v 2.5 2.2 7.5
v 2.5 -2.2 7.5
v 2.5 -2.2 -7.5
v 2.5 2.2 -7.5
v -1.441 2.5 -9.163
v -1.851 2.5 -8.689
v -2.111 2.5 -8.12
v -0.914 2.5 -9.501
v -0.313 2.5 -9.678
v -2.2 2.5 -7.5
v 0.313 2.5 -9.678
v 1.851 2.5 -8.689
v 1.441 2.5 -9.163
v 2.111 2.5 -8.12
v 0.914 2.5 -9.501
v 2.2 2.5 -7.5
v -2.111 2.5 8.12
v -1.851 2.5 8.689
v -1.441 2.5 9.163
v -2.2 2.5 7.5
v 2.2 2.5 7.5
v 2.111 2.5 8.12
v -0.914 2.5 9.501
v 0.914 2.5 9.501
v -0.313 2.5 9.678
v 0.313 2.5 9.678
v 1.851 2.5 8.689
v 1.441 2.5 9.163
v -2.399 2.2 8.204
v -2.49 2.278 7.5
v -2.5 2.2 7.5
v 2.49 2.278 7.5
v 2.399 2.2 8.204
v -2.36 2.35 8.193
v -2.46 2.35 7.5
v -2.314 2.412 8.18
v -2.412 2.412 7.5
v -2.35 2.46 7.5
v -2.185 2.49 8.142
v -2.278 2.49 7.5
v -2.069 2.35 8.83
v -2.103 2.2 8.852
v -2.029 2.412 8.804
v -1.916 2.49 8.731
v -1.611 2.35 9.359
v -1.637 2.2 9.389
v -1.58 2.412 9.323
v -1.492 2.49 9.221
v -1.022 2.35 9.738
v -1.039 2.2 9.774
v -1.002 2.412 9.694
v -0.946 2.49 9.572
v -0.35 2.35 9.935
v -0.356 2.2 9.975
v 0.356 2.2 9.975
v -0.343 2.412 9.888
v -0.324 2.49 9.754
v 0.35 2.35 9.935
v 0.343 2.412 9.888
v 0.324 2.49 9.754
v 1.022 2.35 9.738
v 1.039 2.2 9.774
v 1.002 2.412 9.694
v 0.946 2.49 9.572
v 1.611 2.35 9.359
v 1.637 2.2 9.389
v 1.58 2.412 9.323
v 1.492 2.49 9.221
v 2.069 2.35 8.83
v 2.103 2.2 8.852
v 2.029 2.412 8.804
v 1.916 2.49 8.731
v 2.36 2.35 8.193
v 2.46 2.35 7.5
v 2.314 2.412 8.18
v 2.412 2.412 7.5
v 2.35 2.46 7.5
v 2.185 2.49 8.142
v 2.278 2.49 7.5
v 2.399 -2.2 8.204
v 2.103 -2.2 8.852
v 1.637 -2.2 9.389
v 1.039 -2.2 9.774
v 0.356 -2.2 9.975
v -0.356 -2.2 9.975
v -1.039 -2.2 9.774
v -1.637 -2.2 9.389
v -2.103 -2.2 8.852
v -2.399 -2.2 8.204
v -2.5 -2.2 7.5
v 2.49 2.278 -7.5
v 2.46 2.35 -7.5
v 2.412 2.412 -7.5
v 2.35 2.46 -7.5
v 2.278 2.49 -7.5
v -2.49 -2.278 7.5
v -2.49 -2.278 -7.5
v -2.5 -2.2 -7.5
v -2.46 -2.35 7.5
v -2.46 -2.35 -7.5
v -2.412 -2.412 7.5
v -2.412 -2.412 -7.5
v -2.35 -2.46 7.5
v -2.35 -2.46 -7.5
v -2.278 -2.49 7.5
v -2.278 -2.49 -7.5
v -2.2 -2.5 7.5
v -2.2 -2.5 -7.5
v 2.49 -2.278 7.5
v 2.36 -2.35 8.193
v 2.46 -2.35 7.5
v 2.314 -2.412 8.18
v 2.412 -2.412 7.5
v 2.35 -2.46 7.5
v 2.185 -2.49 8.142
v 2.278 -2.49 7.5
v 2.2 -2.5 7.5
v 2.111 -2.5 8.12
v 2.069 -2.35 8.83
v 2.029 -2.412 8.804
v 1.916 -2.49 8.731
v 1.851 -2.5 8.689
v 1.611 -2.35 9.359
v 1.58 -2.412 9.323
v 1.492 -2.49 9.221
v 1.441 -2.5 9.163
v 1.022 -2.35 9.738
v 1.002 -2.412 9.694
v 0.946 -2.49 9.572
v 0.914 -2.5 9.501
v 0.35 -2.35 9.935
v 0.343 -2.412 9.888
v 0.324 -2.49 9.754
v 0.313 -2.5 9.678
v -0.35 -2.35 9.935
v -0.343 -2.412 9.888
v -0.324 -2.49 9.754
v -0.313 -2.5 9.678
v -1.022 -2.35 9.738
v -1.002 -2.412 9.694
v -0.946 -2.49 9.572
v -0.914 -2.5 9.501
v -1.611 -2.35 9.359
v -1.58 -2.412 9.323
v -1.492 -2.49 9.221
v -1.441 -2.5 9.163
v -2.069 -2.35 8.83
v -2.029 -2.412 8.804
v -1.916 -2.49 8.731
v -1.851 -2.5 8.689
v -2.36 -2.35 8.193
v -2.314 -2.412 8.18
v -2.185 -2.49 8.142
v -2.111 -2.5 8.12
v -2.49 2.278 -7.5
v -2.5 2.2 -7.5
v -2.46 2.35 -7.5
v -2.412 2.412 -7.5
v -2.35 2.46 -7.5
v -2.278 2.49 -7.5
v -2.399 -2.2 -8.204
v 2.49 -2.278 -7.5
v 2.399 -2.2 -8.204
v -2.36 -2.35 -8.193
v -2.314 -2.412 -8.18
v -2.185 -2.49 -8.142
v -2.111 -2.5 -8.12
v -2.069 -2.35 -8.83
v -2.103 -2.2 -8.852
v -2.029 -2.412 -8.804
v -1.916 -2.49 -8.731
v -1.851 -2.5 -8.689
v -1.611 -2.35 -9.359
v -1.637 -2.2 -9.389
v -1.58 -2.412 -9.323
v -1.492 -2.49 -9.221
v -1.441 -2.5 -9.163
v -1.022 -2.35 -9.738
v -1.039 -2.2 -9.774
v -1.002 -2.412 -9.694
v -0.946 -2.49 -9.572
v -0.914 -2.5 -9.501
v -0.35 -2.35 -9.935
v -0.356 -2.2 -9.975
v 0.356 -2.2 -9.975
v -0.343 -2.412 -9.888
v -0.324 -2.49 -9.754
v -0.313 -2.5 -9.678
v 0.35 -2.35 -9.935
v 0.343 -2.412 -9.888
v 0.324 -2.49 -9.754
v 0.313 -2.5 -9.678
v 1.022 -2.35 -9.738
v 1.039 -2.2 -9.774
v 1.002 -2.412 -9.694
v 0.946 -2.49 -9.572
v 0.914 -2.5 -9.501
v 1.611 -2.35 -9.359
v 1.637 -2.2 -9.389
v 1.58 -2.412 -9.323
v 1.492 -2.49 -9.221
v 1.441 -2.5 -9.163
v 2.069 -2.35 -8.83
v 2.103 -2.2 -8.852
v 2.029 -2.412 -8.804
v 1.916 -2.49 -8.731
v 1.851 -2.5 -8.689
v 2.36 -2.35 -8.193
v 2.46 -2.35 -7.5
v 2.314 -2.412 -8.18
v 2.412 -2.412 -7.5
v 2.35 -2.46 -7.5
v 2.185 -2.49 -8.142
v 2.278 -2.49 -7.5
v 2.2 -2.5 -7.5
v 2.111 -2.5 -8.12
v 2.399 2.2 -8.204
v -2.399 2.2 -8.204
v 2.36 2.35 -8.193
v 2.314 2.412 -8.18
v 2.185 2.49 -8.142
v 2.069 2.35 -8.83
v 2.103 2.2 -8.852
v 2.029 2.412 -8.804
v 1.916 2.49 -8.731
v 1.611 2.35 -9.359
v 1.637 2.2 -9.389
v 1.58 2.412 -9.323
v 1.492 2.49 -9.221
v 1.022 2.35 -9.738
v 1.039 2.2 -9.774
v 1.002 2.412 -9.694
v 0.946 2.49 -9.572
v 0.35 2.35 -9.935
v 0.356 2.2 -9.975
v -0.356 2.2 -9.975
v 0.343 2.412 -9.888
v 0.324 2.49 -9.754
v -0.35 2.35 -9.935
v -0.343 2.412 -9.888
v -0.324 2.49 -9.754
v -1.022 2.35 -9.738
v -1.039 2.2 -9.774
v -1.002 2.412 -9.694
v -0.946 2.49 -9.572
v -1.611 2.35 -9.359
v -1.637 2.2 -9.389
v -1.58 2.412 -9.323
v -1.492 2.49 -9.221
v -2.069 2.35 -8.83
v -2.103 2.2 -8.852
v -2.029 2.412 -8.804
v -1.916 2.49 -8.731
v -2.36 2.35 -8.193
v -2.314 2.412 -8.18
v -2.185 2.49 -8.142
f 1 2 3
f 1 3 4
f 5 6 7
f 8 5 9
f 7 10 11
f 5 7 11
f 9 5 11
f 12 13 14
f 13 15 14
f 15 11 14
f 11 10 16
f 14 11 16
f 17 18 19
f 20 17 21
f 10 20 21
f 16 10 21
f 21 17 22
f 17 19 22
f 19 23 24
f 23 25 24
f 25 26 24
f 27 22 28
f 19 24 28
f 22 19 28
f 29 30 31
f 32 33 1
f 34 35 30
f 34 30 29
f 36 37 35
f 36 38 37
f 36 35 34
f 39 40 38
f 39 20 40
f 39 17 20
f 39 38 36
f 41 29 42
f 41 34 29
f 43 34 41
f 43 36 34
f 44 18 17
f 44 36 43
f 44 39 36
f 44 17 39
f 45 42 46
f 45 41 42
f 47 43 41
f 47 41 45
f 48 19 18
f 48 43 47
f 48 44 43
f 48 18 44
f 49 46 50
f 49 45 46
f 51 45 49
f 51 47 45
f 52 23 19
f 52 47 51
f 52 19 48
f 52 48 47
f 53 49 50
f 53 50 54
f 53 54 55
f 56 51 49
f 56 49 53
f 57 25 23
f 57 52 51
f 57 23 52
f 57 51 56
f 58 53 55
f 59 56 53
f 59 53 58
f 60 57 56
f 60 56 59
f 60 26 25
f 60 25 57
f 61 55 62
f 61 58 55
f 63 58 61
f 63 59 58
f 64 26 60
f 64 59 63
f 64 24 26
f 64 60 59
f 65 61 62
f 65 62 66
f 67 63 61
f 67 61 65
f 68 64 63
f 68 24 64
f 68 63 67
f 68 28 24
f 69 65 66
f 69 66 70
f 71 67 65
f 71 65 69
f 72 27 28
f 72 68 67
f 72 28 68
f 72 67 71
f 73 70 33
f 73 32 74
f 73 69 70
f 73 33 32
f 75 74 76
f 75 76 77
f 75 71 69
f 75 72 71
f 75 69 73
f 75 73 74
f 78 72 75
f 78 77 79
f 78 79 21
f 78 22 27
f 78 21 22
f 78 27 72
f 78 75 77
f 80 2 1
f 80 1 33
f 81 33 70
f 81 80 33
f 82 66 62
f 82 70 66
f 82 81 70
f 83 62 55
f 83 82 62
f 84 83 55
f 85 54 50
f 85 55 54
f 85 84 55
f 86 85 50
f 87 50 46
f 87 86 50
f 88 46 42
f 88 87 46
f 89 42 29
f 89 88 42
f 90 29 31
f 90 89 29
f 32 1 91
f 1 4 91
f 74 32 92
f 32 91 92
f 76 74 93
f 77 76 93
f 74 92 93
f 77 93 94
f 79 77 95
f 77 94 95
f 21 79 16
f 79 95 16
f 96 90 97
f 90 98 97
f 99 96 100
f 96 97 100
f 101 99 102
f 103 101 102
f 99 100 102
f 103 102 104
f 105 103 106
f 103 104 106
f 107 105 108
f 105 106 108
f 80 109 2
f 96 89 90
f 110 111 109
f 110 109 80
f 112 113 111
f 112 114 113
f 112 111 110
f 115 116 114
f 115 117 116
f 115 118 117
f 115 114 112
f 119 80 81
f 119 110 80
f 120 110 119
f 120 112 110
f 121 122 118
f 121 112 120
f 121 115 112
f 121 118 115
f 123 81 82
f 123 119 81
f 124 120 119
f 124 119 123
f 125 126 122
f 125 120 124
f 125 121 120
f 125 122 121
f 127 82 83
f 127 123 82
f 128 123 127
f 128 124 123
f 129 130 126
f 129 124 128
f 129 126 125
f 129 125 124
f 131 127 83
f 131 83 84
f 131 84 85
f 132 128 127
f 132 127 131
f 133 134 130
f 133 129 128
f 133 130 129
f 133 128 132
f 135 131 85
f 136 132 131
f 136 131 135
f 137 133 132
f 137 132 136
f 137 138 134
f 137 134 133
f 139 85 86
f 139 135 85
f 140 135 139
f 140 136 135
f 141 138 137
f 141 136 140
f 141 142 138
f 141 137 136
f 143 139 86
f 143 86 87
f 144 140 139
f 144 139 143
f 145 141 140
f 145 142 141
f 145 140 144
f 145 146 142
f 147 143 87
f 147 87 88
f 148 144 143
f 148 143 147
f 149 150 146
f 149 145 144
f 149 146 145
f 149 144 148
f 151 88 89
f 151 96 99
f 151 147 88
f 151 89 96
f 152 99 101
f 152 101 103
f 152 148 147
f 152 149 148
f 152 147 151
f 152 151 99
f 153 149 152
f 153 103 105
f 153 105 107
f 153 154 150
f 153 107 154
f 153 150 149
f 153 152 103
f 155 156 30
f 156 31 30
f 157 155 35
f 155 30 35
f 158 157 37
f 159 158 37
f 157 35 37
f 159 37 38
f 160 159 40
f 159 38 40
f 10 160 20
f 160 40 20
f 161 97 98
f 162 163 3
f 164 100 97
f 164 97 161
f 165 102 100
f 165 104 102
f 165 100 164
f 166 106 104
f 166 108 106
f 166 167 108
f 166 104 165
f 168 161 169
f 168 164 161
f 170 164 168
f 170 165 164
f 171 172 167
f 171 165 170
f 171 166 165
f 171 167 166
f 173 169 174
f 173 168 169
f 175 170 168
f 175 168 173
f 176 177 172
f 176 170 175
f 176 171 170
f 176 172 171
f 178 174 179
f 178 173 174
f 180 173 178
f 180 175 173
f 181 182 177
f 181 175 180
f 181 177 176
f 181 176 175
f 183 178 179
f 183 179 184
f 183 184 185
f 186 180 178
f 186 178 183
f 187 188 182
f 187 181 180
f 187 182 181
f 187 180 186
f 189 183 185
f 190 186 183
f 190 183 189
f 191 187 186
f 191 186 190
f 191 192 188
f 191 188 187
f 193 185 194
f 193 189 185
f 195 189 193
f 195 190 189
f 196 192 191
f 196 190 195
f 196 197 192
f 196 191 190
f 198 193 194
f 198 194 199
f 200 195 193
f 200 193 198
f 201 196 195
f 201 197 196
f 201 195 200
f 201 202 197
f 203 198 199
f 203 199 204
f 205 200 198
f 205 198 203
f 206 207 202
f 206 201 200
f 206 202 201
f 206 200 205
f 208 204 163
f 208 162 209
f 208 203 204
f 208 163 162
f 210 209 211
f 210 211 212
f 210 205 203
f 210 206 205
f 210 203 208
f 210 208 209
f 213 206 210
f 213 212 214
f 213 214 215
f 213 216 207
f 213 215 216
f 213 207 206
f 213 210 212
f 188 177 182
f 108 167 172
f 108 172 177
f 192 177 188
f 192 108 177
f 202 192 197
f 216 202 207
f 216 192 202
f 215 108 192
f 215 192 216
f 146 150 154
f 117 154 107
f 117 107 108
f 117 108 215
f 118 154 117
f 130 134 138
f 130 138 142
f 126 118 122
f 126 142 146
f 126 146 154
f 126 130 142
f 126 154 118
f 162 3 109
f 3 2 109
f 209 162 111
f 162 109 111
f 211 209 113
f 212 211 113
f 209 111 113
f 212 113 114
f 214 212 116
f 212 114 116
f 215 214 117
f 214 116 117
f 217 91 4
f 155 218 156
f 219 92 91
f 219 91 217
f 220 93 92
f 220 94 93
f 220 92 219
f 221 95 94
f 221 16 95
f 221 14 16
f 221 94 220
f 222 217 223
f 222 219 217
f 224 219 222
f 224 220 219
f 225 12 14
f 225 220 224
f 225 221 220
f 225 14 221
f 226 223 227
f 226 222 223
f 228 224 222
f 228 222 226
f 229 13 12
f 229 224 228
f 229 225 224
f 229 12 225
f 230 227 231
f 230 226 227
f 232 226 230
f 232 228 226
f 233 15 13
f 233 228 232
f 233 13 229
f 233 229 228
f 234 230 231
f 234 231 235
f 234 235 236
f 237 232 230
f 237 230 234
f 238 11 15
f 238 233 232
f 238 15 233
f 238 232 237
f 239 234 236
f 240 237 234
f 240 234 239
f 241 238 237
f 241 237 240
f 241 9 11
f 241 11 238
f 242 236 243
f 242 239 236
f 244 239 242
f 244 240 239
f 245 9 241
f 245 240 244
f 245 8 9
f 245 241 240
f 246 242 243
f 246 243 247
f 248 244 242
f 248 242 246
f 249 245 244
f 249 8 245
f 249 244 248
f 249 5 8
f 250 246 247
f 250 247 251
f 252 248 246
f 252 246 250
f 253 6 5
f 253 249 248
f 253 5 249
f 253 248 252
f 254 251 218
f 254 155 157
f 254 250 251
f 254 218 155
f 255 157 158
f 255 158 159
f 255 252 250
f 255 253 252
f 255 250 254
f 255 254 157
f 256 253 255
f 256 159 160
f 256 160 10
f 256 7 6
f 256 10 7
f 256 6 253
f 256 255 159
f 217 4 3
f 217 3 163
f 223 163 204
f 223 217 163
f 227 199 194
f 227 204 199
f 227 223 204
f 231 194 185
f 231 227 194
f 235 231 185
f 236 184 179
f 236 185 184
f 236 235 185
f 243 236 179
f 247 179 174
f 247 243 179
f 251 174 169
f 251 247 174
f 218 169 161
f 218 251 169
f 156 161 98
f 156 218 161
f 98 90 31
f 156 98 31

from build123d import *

# Parameters (mm, degrees)
SKETCH1_W           = 5
SKETCH1_H           = 5
BOSS_EXTRUDE1_DEPTH = 10
FILLET1_RADIUS      = 2.5
FILLET1_LENGTH      = 5
FILLET2_RADIUS      = 2.5
FILLET2_LENGTH      = 5
FILLET3_R           = 0.3


with BuildPart() as part:
    # Sketch1 → Boss-Extrude1 (new, symmetric)
    with BuildSketch(Plane.XY):
        Rectangle(SKETCH1_W, SKETCH1_H)
    extrude(amount=BOSS_EXTRUDE1_DEPTH, both=True)

    # Fillet1: full round fillet: the end face becomes a half cylinder, R = half its width
    fillet1_face = Plane((0, 0, 10), x_dir=(0, -1, 0), z_dir=(0, 0, 1))  # on the end face: x along it, z out of the body
    fillet1_slab = fillet1_face.offset(-FILLET1_RADIUS / 2) * Box(FILLET1_LENGTH, 2 * FILLET1_RADIUS, FILLET1_RADIUS, mode=Mode.PRIVATE)  # the body's end, R deep
    fillet1_round = Plane((0, 0, 7.5), x_dir=(0, 0, 1), z_dir=(0, -1, 0)) * Cylinder(FILLET1_RADIUS, FILLET1_LENGTH, mode=Mode.PRIVATE)  # its axis R under the face
    add(fillet1_slab - fillet1_round, mode=Mode.SUBTRACT)

    # Fillet2: full round fillet: the end face becomes a half cylinder, R = half its width
    fillet2_face = Plane((0, 0, -10), x_dir=(0, 1, 0), z_dir=(0, 0, -1))  # on the end face: x along it, z out of the body
    fillet2_slab = fillet2_face.offset(-FILLET2_RADIUS / 2) * Box(FILLET2_LENGTH, 2 * FILLET2_RADIUS, FILLET2_RADIUS, mode=Mode.PRIVATE)  # the body's end, R deep
    fillet2_round = Plane((0, 0, -7.5), x_dir=(0, 0, -1), z_dir=(0, 1, 0)) * Cylinder(FILLET2_RADIUS, FILLET2_LENGTH, mode=Mode.PRIVATE)  # its axis R under the face
    add(fillet2_slab - fillet2_round, mode=Mode.SUBTRACT)

    # Fillet3
    fillet3_edges = [part.edges().sort_by_distance(p)[0] for p in [
        (2.5, 2.5, 0),
        (2.5, -2.5, 0),
        (-2.5, -2.5, 0),
        (-2.5, 2.5, 0),
        (0, 2.5, 10),
        (0, -2.5, 10),
        (0, -2.5, -10),
        (0, 2.5, -10),
    ]]
    fillet(fillet3_edges, radius=FILLET3_R)


solid = part.part
